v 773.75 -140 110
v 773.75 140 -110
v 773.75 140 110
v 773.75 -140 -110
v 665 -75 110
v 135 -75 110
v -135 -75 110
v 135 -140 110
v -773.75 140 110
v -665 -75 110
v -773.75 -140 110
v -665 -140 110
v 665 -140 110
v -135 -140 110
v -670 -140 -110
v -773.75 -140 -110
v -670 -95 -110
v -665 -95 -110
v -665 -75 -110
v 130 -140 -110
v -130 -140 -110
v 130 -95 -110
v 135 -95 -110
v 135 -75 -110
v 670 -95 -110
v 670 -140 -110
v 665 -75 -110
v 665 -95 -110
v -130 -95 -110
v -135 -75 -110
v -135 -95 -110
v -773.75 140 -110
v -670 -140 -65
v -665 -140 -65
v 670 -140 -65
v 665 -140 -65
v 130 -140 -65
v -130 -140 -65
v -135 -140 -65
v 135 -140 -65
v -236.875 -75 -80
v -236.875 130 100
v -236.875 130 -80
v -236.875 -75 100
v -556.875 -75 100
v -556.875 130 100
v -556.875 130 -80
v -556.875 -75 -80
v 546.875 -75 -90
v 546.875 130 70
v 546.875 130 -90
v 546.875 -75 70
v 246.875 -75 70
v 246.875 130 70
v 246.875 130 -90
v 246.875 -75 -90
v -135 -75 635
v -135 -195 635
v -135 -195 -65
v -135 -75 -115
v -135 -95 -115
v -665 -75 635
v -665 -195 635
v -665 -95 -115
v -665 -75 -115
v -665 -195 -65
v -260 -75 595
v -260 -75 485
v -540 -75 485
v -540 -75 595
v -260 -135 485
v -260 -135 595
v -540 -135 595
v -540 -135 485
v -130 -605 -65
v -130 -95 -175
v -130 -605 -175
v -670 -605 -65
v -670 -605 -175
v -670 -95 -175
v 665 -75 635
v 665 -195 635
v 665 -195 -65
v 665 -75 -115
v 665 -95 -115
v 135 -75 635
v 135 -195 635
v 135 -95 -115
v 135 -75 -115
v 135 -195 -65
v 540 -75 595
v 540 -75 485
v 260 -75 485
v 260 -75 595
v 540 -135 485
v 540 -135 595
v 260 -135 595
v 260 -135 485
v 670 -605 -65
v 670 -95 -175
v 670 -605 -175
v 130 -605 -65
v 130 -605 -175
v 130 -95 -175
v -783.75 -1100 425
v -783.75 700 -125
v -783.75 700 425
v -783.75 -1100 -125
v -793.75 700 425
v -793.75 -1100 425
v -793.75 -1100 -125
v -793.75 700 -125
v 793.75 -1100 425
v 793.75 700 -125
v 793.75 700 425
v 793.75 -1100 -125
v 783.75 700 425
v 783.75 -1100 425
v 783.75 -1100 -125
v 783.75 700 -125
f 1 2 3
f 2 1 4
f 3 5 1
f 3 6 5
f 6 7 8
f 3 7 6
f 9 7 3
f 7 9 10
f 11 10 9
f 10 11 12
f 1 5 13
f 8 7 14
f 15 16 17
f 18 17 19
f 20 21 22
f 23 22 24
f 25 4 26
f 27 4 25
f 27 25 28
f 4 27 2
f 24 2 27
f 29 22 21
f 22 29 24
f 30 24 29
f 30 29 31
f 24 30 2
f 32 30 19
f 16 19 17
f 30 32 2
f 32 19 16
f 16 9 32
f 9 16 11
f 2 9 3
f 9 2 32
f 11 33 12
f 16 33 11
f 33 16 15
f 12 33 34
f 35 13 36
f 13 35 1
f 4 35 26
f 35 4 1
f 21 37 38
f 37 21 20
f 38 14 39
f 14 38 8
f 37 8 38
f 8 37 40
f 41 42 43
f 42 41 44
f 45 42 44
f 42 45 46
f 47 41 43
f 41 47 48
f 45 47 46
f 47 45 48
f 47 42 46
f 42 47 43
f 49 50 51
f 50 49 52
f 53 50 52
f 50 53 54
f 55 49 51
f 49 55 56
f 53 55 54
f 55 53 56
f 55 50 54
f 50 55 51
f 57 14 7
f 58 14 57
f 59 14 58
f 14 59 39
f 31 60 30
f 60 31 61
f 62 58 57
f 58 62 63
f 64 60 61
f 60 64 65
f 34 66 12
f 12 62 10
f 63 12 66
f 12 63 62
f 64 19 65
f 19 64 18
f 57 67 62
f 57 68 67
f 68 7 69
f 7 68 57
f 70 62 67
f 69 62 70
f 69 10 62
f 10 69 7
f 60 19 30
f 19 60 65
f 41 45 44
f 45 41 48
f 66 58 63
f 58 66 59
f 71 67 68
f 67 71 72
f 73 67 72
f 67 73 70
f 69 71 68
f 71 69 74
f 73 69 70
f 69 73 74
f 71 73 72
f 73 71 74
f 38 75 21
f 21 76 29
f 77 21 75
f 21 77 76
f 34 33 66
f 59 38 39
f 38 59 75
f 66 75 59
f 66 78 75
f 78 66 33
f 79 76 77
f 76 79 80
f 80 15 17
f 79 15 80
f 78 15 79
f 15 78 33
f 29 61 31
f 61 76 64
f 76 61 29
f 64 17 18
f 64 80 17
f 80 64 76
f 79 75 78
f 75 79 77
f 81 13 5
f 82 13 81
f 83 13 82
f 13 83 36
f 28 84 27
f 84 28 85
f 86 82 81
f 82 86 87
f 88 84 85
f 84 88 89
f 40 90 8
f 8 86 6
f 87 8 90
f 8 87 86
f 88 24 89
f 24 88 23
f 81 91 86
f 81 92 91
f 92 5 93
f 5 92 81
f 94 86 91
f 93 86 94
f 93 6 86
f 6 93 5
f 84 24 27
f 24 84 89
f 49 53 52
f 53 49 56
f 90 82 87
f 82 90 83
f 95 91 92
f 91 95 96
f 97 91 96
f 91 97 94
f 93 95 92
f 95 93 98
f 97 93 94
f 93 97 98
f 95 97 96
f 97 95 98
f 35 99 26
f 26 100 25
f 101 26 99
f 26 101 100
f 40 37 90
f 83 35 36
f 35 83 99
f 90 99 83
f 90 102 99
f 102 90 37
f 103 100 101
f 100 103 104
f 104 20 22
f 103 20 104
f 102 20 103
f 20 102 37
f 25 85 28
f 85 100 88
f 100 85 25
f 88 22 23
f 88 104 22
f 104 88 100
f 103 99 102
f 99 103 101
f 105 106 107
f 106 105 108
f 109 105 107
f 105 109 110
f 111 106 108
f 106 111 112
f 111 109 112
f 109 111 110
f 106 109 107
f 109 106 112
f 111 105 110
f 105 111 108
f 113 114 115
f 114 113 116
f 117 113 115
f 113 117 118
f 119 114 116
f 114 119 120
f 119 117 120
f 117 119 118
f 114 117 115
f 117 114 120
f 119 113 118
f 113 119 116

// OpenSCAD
// ====================================================================================
// REVOLUTIONARY TECHNOLOGY COMPANY & UNIVERSITY OF WASHINGTON DEPARTMENT OF PHYSICS
// Subsystem: impala_ss_interior.scad (2027 Wave Dashboard & 2016 Pattern Seats)
// Core Application: Stams Cockpit Components Adjusted for 2016 GM Textile Cutters
// Center Origin (0,0,0) = Mid-point of the Interior Cabin Cross-Car Structural Beam
// ====================================================================================

$fn = 120; // High-fidelity molding toolpath and automated fabric pattern cut resolution

// --- 2016/2027 Impala Interior Geometry Constants (mm) ---
inch_to_mm         = 25.4;
cabin_cross_width  = 62.50 * inch_to_mm; // Broad muscle car track width match [INDEX]
seat_pattern_w     = 540.00;             // Sized precisely for 2016 Impala cushion cutters
seat_pattern_d     = 510.00;             // Sized precisely for 2016 Impala backing presses
bose_enclosure_d   = 90.00;              // Fits Bose Neodymium alert arrays [INDEX]

module wave_styled_dashboard() {
    echo("MOLDING 2027 THEME DUAL-WAVE DASHBOARD CONSOLE MATRIX");
    // Front dashboard shroud matching the classic 1967 cowl edge with modern 2027 center waves
    color("DarkCharcoal") {
        difference() {
            // Main horizontal instrument deck shell casing
            cube([cabin_cross_width - 40, 280, 220], center=true);
            
            // Left-side driver dual-pod instrument cowl cavity cut [INDEX]
            translate([-cabin_cross_width/4, -20, 10])
                cube([320, 300, 180], center=true);
                
            // Right-side motorized co-pilot workstation glove box slide cavity [INDEX]
            translate([cabin_cross_width/4, -20, -10])
                cube([300, 300, 160], center=true);
        }
    }
}

module factory_2016_pattern_bucket_seats() {
    echo("COMPILING SEATING ARRAYS: RETAINING 2016 TEXTILE CUTTER BOUNDARIES");
    // Renders front driver and passenger seats upholstered in 2016 Jet Black Premium Cloth
    for (side = [-1, 1]) {
        translate([side * 400, -350, -120]) {
            // Lower cushion base pad
            color("Black") cube([seat_pattern_w, seat_pattern_d, 110], center=true);
            
            // Vertical high-back support with built-in 2027-theme shoulder bolsters
            translate([0, seat_pattern_d/2 - 40, 380]) {
                color("DarkSlateGrey") {
                    difference() {
                        cube([seat_pattern_w - 10, 120, 750], center=true);
                        
                        // INTEGRATED BOSE AUDIO HEADREST TERMINAL CHAMBER
                        // Houses twin speech transducers for real-time safety alert routing [INDEX]
                        translate([0, 35, 280])
                            cube([280.0, 70.0, 110.0], center=true);
                    }
                }
            }
        }
    }
}

module side_trim_inner_panels() {
    // Left and Right inner cabin door panel skins mapped to 2016 vinyl stamp dies
    color("Black") {
        for (side = [-1, 1]) {
            translate([side * (cabin_cross_width/2 - 5), -200, 150])
                cube([10, 1800, 550], center=true);
        }
    }
}

// --- Composite 2027/2016 Interior System Instantiation ---
union() {
    wave_styled_dashboard();
    factory_2016_pattern_bucket_seats();
    side_trim_inner_panels();
}
